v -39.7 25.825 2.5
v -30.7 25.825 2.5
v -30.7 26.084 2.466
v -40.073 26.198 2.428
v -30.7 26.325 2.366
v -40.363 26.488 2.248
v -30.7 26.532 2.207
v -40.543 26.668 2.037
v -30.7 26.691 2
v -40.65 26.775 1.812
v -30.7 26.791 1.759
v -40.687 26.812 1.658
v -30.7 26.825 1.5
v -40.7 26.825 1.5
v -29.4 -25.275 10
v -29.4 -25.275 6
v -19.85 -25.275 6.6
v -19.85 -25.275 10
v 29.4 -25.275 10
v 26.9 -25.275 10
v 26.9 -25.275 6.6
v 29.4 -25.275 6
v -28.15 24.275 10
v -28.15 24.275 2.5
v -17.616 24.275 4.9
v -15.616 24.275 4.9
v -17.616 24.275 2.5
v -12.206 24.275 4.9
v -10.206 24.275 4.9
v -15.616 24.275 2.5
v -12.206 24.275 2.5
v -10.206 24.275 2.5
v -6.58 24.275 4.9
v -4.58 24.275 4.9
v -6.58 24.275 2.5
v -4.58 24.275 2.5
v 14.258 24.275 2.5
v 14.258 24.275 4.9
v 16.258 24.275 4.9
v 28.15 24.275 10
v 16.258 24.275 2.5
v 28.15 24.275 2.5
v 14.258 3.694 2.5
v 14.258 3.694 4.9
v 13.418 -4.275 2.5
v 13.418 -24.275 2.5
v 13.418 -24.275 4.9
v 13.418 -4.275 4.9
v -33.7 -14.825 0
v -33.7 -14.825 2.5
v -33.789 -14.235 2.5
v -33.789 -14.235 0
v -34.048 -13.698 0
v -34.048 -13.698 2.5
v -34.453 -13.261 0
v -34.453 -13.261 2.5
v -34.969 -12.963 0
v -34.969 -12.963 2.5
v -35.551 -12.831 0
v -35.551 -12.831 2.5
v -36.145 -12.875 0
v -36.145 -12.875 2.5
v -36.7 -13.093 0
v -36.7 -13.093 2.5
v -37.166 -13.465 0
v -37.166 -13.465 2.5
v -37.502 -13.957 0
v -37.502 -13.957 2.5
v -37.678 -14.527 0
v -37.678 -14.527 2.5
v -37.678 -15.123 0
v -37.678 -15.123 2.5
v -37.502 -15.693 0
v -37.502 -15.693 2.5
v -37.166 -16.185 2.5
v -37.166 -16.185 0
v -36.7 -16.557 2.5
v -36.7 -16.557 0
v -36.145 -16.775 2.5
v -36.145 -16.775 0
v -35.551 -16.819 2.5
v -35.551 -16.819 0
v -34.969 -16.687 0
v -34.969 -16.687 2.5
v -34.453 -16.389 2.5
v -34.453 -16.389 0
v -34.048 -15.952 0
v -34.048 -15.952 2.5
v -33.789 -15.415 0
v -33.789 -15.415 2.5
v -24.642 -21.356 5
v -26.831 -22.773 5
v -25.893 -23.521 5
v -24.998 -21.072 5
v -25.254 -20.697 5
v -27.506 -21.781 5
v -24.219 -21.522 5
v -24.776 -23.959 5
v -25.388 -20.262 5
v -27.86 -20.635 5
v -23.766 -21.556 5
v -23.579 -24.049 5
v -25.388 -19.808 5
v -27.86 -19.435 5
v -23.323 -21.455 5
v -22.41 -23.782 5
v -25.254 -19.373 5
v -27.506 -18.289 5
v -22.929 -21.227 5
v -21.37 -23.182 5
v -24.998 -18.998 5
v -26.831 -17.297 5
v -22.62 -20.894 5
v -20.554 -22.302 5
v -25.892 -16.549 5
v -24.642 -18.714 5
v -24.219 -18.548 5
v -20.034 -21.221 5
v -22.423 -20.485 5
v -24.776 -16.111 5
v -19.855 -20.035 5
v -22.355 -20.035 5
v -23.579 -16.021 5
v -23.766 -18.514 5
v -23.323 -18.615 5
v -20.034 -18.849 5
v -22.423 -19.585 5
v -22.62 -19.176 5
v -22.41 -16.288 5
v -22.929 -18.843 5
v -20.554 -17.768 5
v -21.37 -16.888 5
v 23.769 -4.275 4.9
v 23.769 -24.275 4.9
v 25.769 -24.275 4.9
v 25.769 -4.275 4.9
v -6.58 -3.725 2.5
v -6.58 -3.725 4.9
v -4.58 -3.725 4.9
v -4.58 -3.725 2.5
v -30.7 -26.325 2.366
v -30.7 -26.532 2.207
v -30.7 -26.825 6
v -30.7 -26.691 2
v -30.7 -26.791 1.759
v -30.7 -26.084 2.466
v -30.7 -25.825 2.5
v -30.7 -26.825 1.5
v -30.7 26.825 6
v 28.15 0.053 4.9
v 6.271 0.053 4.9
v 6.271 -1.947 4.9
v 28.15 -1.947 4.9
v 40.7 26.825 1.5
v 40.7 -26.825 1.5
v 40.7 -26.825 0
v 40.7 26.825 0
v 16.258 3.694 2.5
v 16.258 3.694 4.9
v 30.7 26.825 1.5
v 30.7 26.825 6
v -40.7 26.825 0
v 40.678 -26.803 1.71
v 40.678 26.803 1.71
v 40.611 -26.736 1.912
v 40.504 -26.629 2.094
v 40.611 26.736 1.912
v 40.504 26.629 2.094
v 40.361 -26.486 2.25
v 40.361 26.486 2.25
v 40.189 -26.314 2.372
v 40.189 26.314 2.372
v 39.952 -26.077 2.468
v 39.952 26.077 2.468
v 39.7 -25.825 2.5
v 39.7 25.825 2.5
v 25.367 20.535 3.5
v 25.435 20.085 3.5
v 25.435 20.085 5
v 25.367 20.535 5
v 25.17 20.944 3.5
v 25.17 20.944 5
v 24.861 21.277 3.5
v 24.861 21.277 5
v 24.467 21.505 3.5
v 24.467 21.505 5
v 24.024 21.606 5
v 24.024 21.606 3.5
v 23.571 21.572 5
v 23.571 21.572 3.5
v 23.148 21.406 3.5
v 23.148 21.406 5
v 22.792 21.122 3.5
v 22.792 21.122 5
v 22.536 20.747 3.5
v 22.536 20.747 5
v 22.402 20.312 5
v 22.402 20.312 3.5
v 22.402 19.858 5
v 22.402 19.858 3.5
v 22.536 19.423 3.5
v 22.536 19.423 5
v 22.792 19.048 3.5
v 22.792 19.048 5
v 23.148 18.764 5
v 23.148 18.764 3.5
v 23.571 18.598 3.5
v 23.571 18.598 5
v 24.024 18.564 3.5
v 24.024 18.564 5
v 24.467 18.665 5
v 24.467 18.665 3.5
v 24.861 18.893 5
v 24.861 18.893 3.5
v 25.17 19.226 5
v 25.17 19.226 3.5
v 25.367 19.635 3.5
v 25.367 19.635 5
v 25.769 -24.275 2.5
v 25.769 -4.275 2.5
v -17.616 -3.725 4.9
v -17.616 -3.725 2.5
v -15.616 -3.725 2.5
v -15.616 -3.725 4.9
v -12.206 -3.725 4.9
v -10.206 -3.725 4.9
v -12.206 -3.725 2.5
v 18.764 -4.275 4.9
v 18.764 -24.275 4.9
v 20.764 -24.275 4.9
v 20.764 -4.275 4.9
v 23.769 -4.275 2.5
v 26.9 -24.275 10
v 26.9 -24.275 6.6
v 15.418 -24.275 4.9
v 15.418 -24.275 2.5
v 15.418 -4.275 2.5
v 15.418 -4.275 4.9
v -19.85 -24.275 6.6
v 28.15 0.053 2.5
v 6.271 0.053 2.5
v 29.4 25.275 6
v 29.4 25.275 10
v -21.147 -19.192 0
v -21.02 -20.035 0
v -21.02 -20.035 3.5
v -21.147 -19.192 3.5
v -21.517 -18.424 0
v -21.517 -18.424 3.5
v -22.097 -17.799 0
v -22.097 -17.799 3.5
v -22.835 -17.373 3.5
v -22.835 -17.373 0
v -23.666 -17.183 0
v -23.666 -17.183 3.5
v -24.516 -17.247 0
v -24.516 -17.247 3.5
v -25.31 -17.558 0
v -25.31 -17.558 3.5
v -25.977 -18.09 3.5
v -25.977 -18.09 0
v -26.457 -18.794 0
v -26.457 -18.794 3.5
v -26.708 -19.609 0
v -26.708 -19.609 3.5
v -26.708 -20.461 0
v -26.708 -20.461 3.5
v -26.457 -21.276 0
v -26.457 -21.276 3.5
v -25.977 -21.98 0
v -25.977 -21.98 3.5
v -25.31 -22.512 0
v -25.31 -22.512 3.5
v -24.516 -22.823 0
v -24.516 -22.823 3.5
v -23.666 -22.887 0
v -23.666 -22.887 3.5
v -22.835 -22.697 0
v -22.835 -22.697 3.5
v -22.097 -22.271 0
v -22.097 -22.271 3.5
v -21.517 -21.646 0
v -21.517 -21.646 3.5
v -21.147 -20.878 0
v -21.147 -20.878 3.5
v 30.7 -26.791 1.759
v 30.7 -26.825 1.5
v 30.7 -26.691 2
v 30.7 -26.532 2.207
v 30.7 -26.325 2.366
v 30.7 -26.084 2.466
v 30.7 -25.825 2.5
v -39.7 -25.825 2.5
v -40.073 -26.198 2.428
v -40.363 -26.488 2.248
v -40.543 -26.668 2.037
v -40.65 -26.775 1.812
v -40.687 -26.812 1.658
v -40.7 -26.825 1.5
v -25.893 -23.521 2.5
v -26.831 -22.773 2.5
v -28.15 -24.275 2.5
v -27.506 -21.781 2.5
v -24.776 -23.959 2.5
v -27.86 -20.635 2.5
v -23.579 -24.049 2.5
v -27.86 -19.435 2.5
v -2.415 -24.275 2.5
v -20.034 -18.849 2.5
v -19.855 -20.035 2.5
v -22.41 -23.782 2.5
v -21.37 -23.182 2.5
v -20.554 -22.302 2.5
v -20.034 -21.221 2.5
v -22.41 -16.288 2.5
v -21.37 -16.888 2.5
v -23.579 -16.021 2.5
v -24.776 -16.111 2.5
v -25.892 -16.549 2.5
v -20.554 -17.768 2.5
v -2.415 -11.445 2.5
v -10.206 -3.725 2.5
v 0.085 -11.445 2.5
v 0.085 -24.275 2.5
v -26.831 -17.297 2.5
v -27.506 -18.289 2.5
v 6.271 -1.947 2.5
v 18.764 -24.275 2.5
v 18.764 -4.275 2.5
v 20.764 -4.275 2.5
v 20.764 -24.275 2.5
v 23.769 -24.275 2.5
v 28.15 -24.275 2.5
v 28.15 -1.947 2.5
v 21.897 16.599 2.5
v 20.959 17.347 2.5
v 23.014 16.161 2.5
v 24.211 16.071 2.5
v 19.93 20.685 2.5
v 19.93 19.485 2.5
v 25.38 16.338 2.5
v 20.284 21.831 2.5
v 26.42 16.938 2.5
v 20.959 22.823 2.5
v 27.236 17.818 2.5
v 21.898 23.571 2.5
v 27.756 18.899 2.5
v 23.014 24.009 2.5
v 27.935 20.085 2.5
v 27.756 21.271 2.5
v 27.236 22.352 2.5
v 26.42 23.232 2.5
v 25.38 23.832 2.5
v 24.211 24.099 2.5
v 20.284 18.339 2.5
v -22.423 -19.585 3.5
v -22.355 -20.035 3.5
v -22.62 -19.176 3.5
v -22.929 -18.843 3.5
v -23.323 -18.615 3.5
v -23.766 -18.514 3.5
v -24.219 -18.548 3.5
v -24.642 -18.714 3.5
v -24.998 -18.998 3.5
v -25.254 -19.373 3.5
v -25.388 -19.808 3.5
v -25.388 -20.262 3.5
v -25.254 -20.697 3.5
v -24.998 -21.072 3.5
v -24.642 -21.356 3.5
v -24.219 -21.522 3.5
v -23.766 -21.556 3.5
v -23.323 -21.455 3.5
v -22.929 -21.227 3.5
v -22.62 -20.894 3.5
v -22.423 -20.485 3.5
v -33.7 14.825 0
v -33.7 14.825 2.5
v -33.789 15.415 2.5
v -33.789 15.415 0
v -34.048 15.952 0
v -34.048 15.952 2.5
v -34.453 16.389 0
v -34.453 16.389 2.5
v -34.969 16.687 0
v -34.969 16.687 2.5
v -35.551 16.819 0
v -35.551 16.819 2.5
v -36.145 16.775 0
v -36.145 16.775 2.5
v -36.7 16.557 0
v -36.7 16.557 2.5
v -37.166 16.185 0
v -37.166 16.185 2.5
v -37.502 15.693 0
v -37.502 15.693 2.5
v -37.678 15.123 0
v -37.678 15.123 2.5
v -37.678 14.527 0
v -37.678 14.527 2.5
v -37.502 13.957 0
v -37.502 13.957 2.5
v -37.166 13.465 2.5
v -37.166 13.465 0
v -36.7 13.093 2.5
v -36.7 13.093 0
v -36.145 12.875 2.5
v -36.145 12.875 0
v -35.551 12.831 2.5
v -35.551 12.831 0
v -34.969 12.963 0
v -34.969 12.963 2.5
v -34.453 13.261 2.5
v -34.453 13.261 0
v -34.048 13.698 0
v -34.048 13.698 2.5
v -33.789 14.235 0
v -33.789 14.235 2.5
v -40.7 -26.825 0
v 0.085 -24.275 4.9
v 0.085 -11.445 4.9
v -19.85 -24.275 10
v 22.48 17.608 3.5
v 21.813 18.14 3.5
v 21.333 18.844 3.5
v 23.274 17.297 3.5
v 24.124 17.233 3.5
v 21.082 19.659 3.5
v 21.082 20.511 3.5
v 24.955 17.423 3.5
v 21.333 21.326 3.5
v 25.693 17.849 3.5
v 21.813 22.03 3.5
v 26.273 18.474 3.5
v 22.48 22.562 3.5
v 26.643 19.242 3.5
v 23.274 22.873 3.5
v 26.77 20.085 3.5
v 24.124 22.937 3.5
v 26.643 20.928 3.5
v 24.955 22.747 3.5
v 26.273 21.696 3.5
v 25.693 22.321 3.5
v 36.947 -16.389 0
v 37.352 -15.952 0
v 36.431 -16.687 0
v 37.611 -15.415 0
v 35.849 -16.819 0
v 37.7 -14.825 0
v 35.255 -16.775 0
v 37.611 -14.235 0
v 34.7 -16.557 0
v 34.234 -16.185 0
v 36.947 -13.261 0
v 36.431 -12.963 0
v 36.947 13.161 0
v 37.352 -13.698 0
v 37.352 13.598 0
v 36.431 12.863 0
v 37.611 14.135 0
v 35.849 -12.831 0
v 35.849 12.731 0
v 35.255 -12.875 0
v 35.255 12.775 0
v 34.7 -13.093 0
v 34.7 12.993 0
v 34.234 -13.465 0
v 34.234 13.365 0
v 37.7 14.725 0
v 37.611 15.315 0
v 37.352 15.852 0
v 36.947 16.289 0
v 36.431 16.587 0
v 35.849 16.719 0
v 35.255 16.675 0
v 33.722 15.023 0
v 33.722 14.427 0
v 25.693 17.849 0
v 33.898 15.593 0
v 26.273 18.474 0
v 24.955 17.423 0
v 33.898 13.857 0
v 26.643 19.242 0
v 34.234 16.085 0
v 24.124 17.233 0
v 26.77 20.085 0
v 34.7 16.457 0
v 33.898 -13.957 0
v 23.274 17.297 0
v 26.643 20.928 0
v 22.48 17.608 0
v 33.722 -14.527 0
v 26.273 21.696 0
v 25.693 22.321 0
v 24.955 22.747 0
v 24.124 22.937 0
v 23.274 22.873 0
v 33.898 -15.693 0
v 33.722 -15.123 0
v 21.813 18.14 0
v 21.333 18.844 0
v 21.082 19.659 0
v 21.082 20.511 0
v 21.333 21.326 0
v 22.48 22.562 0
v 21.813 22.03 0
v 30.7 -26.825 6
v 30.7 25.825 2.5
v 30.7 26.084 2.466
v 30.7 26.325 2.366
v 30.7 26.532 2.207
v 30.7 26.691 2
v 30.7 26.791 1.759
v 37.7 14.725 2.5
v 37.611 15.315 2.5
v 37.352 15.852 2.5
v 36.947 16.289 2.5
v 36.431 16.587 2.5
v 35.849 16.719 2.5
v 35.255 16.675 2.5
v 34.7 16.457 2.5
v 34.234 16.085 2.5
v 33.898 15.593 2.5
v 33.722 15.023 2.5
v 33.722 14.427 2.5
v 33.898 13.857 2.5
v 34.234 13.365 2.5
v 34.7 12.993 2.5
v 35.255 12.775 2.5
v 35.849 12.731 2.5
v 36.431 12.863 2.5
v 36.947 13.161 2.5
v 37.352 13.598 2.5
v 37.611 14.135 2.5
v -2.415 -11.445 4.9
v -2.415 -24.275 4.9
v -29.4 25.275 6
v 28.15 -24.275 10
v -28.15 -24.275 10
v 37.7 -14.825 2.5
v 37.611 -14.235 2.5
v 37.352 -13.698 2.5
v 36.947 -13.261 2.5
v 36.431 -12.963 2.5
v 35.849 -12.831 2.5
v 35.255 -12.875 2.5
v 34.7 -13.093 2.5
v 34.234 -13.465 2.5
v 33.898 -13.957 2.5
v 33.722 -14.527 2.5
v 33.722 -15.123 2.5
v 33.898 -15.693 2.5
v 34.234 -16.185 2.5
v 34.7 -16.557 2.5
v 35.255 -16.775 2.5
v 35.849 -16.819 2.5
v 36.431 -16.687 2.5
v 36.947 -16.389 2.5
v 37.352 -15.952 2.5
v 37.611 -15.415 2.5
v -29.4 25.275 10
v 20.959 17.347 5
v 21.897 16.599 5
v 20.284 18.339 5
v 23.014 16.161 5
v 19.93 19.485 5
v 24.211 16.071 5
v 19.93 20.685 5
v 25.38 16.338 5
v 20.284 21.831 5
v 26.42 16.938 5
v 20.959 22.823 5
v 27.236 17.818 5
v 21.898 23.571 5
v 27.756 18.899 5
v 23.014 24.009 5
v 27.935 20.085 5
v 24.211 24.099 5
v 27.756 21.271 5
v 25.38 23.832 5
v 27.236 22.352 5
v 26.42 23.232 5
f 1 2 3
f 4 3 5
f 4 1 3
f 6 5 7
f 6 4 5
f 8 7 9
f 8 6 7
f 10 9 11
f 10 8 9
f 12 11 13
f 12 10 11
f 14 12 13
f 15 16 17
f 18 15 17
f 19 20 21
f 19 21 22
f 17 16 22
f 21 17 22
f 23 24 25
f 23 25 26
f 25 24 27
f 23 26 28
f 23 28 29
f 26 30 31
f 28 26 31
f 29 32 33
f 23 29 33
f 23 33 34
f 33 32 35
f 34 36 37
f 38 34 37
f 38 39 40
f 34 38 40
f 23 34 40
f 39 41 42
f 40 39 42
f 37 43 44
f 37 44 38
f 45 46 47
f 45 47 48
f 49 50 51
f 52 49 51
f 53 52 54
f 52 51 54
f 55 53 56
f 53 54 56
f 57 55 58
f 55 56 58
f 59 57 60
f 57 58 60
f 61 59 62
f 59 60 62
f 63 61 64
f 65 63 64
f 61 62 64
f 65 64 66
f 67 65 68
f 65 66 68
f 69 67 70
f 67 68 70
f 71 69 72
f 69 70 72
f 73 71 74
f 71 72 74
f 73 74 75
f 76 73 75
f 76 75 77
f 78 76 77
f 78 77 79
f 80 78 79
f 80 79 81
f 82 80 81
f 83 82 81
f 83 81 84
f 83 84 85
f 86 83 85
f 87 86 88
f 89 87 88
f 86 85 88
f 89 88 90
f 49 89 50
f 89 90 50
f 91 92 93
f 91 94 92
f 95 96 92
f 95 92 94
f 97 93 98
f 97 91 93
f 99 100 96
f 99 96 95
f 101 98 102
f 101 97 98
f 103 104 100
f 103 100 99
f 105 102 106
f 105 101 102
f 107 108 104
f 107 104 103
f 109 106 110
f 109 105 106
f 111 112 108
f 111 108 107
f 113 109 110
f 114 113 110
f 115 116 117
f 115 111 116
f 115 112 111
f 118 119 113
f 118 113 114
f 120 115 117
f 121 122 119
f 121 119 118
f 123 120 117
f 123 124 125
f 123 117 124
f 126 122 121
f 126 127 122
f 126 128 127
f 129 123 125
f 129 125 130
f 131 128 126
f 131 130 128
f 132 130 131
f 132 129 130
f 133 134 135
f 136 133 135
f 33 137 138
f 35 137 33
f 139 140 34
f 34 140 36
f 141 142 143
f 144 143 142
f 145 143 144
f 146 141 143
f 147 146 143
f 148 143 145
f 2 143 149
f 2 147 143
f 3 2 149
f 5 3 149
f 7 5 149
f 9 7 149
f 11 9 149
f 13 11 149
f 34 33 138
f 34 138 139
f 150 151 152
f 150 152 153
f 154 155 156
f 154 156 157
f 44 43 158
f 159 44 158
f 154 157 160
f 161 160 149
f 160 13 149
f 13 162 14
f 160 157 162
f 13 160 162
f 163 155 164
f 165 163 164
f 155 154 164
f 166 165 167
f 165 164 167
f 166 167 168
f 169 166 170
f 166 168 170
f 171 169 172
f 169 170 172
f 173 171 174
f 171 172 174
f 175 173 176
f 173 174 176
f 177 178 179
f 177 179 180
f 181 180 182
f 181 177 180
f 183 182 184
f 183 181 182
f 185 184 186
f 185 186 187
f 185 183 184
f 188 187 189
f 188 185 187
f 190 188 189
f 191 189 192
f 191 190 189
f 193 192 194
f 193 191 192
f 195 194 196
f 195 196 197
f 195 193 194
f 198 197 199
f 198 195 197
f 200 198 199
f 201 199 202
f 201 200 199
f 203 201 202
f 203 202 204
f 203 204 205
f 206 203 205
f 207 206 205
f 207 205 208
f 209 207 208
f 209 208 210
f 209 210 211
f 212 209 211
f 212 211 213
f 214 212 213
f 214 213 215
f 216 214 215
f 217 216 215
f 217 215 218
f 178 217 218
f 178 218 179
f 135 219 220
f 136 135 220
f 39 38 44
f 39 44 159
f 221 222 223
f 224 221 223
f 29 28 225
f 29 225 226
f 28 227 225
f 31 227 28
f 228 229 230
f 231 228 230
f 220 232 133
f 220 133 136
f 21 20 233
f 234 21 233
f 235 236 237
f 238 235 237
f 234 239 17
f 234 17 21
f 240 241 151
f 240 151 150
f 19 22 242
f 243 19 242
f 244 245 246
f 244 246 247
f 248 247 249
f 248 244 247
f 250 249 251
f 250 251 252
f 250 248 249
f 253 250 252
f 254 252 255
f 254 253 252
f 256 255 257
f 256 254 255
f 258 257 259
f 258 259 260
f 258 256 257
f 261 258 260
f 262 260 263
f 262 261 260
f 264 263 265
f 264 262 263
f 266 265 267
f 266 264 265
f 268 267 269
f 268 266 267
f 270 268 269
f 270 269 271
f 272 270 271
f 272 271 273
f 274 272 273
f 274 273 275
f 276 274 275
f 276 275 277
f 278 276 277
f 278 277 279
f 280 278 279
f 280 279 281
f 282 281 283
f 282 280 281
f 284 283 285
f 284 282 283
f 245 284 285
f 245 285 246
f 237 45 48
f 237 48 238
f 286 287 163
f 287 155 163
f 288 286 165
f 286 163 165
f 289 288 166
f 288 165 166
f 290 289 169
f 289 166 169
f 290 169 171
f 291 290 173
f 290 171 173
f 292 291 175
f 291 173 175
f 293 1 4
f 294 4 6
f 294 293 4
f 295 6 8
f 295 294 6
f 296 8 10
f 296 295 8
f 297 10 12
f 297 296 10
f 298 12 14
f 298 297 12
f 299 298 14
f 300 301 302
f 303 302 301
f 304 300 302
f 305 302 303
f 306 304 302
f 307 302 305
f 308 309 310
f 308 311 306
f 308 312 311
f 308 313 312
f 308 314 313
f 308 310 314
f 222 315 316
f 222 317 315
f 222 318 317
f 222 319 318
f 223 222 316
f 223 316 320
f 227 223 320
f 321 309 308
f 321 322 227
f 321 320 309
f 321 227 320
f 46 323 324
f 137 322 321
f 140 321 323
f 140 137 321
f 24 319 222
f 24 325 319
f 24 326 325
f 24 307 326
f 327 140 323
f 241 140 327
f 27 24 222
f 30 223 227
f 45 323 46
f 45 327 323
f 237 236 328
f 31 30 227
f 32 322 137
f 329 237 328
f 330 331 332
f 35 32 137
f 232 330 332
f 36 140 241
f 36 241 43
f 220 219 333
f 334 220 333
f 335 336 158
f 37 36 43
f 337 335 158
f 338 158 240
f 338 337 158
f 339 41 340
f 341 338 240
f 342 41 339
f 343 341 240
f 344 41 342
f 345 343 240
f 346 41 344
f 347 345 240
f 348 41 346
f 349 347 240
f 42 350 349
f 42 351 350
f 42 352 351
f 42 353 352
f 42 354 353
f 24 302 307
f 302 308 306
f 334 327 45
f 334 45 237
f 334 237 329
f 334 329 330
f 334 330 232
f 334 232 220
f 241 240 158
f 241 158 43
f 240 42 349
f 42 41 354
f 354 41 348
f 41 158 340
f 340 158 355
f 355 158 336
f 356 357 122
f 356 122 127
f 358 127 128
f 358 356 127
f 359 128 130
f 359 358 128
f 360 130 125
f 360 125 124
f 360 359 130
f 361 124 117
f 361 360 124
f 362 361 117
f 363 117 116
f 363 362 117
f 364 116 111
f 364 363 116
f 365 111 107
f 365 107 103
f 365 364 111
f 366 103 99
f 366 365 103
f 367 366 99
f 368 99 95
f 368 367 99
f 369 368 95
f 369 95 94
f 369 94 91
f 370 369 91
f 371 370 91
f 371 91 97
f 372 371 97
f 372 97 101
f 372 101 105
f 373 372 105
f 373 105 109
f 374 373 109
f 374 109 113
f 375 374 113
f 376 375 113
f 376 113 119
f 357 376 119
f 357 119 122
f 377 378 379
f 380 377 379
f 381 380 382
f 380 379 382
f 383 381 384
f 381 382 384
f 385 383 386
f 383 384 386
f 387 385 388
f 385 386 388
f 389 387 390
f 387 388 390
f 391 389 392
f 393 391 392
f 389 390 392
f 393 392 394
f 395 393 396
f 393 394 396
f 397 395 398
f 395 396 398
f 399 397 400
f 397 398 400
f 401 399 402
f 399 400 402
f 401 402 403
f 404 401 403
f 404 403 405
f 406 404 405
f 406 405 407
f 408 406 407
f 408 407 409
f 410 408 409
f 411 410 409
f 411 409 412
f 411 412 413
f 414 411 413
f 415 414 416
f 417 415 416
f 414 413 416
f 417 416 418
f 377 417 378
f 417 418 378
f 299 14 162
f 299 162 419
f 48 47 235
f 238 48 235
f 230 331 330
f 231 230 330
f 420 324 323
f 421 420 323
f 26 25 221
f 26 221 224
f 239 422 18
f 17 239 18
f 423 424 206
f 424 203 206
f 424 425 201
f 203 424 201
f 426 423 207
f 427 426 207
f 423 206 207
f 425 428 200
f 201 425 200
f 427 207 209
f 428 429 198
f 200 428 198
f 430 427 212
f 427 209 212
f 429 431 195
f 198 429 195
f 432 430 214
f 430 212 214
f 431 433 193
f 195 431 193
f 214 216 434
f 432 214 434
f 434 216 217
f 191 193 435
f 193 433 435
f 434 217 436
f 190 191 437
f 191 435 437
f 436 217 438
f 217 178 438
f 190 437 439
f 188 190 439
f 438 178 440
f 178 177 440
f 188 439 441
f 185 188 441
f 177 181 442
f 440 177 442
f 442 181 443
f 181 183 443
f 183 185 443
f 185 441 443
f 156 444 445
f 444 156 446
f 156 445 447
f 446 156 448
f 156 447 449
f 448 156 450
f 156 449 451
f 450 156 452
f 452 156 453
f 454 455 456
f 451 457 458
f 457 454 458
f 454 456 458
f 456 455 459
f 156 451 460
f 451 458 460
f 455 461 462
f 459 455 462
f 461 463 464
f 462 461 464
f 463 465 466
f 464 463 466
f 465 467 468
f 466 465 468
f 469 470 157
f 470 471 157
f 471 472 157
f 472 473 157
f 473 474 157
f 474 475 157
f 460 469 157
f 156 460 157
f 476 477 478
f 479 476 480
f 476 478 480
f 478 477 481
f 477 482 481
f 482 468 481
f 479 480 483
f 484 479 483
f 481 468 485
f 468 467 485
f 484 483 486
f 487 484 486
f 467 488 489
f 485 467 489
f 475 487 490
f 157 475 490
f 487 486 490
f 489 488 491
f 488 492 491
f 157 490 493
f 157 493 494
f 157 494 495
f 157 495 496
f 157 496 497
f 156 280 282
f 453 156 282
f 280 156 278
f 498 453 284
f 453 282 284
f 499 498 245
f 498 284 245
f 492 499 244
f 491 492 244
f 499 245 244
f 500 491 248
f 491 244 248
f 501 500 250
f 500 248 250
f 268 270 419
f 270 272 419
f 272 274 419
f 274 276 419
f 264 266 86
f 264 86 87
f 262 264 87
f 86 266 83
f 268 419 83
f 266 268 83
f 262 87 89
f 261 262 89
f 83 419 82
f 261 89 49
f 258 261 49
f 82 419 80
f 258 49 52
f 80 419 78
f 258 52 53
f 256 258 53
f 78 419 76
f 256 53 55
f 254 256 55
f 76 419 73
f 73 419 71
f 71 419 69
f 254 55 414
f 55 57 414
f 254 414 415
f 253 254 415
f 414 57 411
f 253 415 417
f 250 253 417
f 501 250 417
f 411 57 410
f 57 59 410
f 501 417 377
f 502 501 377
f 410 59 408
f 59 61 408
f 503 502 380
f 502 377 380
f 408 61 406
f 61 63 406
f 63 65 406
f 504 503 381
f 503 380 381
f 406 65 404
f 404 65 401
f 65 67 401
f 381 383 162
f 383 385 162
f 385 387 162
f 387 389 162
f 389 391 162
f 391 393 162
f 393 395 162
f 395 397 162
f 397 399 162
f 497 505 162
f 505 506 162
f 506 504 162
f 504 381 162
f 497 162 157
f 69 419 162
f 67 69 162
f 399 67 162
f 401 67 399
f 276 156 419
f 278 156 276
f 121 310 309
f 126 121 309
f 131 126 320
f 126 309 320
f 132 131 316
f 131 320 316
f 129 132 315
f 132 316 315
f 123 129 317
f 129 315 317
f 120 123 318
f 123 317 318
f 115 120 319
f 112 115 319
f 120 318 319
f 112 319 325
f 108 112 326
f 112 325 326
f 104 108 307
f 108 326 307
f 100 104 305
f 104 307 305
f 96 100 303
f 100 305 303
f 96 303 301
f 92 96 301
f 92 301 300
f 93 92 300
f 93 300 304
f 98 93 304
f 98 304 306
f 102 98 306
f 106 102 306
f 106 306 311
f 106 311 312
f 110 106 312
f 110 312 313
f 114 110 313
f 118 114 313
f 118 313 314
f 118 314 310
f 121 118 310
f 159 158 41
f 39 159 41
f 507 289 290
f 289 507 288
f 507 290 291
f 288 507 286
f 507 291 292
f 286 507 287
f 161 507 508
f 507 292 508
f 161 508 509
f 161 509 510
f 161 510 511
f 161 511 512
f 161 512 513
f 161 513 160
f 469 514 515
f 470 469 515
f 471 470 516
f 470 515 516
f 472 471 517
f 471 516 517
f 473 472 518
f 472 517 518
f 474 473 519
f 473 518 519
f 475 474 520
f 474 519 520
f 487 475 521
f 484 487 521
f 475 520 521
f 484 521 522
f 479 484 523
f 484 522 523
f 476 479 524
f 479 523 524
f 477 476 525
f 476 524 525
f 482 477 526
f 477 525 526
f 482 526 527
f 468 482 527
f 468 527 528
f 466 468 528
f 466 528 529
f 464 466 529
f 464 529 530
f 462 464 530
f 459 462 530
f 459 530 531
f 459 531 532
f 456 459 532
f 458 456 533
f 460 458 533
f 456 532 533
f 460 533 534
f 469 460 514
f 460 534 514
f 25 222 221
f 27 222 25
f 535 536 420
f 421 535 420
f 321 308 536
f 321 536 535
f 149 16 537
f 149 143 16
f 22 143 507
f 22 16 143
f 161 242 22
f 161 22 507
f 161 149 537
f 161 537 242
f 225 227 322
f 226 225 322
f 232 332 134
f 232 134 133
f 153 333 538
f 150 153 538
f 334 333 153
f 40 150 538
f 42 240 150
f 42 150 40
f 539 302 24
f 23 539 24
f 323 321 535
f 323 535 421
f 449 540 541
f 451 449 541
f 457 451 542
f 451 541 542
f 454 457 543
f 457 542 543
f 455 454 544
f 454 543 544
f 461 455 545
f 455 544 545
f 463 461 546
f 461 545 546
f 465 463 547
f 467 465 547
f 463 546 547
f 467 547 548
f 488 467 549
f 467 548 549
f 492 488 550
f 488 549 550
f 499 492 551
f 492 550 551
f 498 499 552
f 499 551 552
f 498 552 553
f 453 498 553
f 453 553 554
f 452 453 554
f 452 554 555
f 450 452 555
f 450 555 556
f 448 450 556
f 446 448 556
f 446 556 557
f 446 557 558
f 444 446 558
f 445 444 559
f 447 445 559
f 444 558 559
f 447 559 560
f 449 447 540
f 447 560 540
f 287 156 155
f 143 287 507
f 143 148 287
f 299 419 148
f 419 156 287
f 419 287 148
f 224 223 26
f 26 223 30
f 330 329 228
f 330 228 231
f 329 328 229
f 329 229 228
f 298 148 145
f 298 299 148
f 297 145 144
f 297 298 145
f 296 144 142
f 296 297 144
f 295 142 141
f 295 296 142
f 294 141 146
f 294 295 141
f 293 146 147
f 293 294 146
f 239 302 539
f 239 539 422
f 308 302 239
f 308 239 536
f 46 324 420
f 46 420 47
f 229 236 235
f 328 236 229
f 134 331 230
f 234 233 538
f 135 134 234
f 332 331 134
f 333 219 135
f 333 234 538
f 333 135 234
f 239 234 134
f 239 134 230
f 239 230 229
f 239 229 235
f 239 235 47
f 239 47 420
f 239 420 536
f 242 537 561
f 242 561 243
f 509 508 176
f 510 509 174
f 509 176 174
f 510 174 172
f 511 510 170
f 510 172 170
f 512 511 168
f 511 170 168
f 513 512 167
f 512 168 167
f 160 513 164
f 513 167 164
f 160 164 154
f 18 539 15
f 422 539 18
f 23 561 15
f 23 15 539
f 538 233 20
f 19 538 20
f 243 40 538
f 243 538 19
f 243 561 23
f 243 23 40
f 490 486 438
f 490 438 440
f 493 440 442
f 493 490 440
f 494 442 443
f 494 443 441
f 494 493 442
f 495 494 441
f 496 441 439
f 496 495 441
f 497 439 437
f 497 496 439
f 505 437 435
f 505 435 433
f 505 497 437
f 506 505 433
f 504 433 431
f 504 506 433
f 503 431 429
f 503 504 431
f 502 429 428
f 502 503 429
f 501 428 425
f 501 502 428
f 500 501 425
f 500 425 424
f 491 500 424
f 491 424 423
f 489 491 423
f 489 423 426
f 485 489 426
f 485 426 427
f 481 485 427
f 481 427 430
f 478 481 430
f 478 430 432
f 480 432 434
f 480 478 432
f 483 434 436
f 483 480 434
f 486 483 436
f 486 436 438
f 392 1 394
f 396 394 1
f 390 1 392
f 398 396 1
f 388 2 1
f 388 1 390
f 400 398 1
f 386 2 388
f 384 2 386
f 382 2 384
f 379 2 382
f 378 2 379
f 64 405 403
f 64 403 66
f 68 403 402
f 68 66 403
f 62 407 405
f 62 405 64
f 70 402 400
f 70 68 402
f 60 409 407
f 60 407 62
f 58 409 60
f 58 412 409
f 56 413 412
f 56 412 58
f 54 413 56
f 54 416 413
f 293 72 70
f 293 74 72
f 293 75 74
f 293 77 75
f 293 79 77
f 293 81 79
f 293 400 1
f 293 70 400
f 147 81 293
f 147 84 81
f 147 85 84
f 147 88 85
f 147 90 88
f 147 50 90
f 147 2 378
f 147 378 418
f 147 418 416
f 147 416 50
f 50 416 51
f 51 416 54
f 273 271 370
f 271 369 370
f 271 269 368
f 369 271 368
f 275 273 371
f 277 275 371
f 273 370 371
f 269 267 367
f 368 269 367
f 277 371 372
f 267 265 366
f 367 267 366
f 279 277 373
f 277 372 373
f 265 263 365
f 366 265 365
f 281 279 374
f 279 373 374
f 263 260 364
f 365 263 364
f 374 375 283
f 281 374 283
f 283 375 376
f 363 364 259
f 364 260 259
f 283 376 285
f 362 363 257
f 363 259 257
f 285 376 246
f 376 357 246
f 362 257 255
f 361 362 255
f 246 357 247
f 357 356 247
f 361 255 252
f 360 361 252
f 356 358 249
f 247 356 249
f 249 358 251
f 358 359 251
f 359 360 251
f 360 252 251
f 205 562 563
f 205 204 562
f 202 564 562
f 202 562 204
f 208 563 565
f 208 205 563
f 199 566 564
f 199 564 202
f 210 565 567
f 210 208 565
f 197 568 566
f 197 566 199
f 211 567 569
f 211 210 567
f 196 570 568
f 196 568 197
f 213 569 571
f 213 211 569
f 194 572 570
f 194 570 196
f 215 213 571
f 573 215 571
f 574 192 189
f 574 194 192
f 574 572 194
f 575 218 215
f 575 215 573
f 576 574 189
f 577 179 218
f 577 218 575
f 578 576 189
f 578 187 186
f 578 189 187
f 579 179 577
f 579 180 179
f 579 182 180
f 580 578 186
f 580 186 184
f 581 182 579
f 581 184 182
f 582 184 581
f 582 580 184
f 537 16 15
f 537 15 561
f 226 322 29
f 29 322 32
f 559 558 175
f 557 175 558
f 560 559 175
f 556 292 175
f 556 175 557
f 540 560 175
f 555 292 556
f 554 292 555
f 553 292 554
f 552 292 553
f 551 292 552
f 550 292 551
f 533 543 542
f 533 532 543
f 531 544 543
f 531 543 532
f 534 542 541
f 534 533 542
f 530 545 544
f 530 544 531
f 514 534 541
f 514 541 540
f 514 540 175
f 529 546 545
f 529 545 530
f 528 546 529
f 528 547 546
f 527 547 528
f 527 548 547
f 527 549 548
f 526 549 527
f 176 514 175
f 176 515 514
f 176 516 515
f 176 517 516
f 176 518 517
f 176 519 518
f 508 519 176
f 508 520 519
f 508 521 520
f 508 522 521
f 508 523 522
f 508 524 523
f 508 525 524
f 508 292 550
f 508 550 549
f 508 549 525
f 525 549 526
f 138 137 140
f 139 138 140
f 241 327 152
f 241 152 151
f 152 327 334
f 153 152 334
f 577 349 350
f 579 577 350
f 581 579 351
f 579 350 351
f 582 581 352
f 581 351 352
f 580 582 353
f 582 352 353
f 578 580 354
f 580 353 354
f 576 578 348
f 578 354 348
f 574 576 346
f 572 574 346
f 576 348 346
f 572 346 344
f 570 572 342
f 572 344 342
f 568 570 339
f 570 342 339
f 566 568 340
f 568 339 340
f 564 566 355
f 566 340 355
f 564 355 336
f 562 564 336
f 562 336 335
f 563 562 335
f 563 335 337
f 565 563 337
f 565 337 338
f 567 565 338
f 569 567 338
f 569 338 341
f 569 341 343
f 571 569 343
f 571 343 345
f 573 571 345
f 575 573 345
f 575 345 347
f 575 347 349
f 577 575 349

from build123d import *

# Parameters (mm, degrees)
F0_W      = 56.2999993563
F0_H      = 48.5499993563
F0_R      = 4.025
F1_DEPTH  = 2.5
F0_R_2    = 2.86
F0_R_3    = 1.525
F2_DEPTH  = 5
F0_W_2    = 58.7999993563
F0_H_2    = 50.5499993563
F3_DEPTH  = 10
F0_W_3    = 61.3999993563
F0_H_3    = 53.6499993563
F4_DEPTH  = 6
F5_DEPTH  = 3.5
F6_W      = 53.6499993563
F6_H      = 2.5
F8_DEPTH  = 10
F7_W      = 53.6499993563
F7_H      = 2.5
F9_DEPTH  = 10
F10_R     = 2
F11_R     = 2
F12_DEPTH = 2.5
F13_W     = 46.75
F13_H     = 1
F13_H_2   = 1.5
F14_DEPTH = 3.4
F15_W     = 2
F15_H     = 28
F15_H_2   = 20.5807207916
F15_W_2   = 21.8790904619
F15_H_3   = 2
F15_H_4   = 20
F15_W_3   = 2.5
F15_H_5   = 12.8300296441
F16_DEPTH = 2.4
F17_R     = 1


with BuildPart() as f1:
    # F0 (on Top) → F1 (new body)
    with BuildSketch(Plane.XY):
        Rectangle(F0_W, F0_H)
        with Locations((-23.88, -20.035)):
            Circle(F0_R, mode=Mode.SUBTRACT)
        with Locations((23.91, 20.085)):
            Circle(F0_R, mode=Mode.SUBTRACT)
    extrude(amount=F1_DEPTH)

    # F0 (on Top) → F2 (join)
    with BuildSketch(Plane.XY):
        with Locations((-23.88, -20.035)):
            Circle(F0_R)
        with Locations((-23.88, -20.035)):
            Circle(F0_R_2, mode=Mode.SUBTRACT)
        with Locations((-23.88, -20.035)):
            Circle(F0_R_2)
        with Locations((-23.88, -20.035)):
            Circle(F0_R_3, mode=Mode.SUBTRACT)
        with Locations((23.91, 20.085)):
            Circle(F0_R)
        with Locations((23.91, 20.085)):
            Circle(F0_R_2, mode=Mode.SUBTRACT)
        with Locations((23.91, 20.085)):
            Circle(F0_R_2)
        with Locations((23.91, 20.085)):
            Circle(F0_R_3, mode=Mode.SUBTRACT)
    extrude(amount=F2_DEPTH)

    # F0 (on Top) → F3 (join)
    with BuildSketch(Plane.XY):
        Rectangle(F0_W_2, F0_H_2)
        Rectangle(F0_W, F0_H, mode=Mode.SUBTRACT)
    extrude(amount=F3_DEPTH)

    # F0 (on Top) → F4 (join)
    with BuildSketch(Plane.XY):
        Rectangle(F0_W_3, F0_H_3)
        Rectangle(F0_W_2, F0_H_2, mode=Mode.SUBTRACT)
    extrude(amount=F4_DEPTH)

    # F0 (on Top) → F5 (cut)
    with BuildSketch(Plane.XY):
        with Locations((-23.88, -20.035)):
            Circle(F0_R_2)
        with Locations((-23.88, -20.035)):
            Circle(F0_R_3, mode=Mode.SUBTRACT)
        with Locations((23.91, 20.085)):
            Circle(F0_R_2)
        with Locations((23.91, 20.085)):
            Circle(F0_R_3, mode=Mode.SUBTRACT)
    extrude(amount=F5_DEPTH, mode=Mode.SUBTRACT)

    # F6 (on face) → F8 (join)
    with BuildSketch(Plane(origin=(-30.6999996781, 0, 0), x_dir=(0, -1, 0), z_dir=(-1, 0, 0))):
        with Locations((0, 1.25)):
            Rectangle(F6_W, F6_H)
    extrude(amount=F8_DEPTH)

    # F7 (on face) → F9 (join)
    with BuildSketch(Plane.YZ.offset(30.6999996781)):
        with Locations((0, 1.25)):
            Rectangle(F7_W, F7_H)
    extrude(amount=F9_DEPTH)

    # F10 (on face) + F11 (on face) → F12 (cut)
    with BuildSketch(Plane.XY.offset(2.5)):
        with Locations((-35.6999996781, 14.8249996781)):
            Circle(F10_R)
        with Locations((-35.6999996781, -14.8249996781)):
            Circle(F10_R)
    with BuildSketch(Plane.XY.offset(2.5)):
        with Locations((35.6999996781, 14.7250003219)):
            Circle(F11_R)
        with Locations((35.6999996781, -14.8249996781)):
            Circle(F11_R)
    extrude(amount=-F12_DEPTH, mode=Mode.SUBTRACT)

    # F13 (on face) → F14 (cut)
    with BuildSketch(Plane.XY.offset(10)):
        with Locations((3.5249996781, -24.7749996781)):
            Rectangle(F13_W, F13_H)
        with Locations((3.5249996781, -26.0249996781)):
            Rectangle(F13_W, F13_H_2)
    extrude(amount=-F14_DEPTH, mode=Mode.SUBTRACT)

    # F15 (on face) → F16 (join)
    with BuildSketch(Plane.XY.offset(2.5)):
        with Locations((-16.6158268005, 10.2749996781)):
            Rectangle(F15_W, F15_H)
        with Locations((-11.205850333, 10.2749996781)):
            Rectangle(F15_W, F15_H)
        with Locations((-5.5801804885, 10.2749996781)):
            Rectangle(F15_W, F15_H)
        with Locations((15.2583353445, 13.9846392823)):
            Rectangle(F15_W, F15_H_2)
        with Locations((17.2104544472, -0.9468855462)):
            Rectangle(F15_W_2, F15_H_3)
        with Locations((14.4178884327, -14.2749996781)):
            Rectangle(F15_W, F15_H_4)
        with Locations((19.7637628987, -14.2749996781)):
            Rectangle(F15_W, F15_H_4)
        with Locations((24.7685218453, -14.2749996781)):
            Rectangle(F15_W, F15_H_4)
        with Locations((-1.164972987, -17.8599848561)):
            Rectangle(F15_W_3, F15_H_5)
    extrude(amount=F16_DEPTH)

    # F17
    f17_edges = [f1.edges().sort_by_distance(p)[0] for p in [
        (-40.7, 0, 2.5),
        (40.7, 0, 2.5),
        (-35.7, 26.825, 2.5),
        (-35.7, -26.825, 2.5),
        (35.7, -26.825, 2.5),
        (35.7, 26.825, 2.5),
    ]]
    fillet(f17_edges, radius=F17_R)


solid = f1.part
